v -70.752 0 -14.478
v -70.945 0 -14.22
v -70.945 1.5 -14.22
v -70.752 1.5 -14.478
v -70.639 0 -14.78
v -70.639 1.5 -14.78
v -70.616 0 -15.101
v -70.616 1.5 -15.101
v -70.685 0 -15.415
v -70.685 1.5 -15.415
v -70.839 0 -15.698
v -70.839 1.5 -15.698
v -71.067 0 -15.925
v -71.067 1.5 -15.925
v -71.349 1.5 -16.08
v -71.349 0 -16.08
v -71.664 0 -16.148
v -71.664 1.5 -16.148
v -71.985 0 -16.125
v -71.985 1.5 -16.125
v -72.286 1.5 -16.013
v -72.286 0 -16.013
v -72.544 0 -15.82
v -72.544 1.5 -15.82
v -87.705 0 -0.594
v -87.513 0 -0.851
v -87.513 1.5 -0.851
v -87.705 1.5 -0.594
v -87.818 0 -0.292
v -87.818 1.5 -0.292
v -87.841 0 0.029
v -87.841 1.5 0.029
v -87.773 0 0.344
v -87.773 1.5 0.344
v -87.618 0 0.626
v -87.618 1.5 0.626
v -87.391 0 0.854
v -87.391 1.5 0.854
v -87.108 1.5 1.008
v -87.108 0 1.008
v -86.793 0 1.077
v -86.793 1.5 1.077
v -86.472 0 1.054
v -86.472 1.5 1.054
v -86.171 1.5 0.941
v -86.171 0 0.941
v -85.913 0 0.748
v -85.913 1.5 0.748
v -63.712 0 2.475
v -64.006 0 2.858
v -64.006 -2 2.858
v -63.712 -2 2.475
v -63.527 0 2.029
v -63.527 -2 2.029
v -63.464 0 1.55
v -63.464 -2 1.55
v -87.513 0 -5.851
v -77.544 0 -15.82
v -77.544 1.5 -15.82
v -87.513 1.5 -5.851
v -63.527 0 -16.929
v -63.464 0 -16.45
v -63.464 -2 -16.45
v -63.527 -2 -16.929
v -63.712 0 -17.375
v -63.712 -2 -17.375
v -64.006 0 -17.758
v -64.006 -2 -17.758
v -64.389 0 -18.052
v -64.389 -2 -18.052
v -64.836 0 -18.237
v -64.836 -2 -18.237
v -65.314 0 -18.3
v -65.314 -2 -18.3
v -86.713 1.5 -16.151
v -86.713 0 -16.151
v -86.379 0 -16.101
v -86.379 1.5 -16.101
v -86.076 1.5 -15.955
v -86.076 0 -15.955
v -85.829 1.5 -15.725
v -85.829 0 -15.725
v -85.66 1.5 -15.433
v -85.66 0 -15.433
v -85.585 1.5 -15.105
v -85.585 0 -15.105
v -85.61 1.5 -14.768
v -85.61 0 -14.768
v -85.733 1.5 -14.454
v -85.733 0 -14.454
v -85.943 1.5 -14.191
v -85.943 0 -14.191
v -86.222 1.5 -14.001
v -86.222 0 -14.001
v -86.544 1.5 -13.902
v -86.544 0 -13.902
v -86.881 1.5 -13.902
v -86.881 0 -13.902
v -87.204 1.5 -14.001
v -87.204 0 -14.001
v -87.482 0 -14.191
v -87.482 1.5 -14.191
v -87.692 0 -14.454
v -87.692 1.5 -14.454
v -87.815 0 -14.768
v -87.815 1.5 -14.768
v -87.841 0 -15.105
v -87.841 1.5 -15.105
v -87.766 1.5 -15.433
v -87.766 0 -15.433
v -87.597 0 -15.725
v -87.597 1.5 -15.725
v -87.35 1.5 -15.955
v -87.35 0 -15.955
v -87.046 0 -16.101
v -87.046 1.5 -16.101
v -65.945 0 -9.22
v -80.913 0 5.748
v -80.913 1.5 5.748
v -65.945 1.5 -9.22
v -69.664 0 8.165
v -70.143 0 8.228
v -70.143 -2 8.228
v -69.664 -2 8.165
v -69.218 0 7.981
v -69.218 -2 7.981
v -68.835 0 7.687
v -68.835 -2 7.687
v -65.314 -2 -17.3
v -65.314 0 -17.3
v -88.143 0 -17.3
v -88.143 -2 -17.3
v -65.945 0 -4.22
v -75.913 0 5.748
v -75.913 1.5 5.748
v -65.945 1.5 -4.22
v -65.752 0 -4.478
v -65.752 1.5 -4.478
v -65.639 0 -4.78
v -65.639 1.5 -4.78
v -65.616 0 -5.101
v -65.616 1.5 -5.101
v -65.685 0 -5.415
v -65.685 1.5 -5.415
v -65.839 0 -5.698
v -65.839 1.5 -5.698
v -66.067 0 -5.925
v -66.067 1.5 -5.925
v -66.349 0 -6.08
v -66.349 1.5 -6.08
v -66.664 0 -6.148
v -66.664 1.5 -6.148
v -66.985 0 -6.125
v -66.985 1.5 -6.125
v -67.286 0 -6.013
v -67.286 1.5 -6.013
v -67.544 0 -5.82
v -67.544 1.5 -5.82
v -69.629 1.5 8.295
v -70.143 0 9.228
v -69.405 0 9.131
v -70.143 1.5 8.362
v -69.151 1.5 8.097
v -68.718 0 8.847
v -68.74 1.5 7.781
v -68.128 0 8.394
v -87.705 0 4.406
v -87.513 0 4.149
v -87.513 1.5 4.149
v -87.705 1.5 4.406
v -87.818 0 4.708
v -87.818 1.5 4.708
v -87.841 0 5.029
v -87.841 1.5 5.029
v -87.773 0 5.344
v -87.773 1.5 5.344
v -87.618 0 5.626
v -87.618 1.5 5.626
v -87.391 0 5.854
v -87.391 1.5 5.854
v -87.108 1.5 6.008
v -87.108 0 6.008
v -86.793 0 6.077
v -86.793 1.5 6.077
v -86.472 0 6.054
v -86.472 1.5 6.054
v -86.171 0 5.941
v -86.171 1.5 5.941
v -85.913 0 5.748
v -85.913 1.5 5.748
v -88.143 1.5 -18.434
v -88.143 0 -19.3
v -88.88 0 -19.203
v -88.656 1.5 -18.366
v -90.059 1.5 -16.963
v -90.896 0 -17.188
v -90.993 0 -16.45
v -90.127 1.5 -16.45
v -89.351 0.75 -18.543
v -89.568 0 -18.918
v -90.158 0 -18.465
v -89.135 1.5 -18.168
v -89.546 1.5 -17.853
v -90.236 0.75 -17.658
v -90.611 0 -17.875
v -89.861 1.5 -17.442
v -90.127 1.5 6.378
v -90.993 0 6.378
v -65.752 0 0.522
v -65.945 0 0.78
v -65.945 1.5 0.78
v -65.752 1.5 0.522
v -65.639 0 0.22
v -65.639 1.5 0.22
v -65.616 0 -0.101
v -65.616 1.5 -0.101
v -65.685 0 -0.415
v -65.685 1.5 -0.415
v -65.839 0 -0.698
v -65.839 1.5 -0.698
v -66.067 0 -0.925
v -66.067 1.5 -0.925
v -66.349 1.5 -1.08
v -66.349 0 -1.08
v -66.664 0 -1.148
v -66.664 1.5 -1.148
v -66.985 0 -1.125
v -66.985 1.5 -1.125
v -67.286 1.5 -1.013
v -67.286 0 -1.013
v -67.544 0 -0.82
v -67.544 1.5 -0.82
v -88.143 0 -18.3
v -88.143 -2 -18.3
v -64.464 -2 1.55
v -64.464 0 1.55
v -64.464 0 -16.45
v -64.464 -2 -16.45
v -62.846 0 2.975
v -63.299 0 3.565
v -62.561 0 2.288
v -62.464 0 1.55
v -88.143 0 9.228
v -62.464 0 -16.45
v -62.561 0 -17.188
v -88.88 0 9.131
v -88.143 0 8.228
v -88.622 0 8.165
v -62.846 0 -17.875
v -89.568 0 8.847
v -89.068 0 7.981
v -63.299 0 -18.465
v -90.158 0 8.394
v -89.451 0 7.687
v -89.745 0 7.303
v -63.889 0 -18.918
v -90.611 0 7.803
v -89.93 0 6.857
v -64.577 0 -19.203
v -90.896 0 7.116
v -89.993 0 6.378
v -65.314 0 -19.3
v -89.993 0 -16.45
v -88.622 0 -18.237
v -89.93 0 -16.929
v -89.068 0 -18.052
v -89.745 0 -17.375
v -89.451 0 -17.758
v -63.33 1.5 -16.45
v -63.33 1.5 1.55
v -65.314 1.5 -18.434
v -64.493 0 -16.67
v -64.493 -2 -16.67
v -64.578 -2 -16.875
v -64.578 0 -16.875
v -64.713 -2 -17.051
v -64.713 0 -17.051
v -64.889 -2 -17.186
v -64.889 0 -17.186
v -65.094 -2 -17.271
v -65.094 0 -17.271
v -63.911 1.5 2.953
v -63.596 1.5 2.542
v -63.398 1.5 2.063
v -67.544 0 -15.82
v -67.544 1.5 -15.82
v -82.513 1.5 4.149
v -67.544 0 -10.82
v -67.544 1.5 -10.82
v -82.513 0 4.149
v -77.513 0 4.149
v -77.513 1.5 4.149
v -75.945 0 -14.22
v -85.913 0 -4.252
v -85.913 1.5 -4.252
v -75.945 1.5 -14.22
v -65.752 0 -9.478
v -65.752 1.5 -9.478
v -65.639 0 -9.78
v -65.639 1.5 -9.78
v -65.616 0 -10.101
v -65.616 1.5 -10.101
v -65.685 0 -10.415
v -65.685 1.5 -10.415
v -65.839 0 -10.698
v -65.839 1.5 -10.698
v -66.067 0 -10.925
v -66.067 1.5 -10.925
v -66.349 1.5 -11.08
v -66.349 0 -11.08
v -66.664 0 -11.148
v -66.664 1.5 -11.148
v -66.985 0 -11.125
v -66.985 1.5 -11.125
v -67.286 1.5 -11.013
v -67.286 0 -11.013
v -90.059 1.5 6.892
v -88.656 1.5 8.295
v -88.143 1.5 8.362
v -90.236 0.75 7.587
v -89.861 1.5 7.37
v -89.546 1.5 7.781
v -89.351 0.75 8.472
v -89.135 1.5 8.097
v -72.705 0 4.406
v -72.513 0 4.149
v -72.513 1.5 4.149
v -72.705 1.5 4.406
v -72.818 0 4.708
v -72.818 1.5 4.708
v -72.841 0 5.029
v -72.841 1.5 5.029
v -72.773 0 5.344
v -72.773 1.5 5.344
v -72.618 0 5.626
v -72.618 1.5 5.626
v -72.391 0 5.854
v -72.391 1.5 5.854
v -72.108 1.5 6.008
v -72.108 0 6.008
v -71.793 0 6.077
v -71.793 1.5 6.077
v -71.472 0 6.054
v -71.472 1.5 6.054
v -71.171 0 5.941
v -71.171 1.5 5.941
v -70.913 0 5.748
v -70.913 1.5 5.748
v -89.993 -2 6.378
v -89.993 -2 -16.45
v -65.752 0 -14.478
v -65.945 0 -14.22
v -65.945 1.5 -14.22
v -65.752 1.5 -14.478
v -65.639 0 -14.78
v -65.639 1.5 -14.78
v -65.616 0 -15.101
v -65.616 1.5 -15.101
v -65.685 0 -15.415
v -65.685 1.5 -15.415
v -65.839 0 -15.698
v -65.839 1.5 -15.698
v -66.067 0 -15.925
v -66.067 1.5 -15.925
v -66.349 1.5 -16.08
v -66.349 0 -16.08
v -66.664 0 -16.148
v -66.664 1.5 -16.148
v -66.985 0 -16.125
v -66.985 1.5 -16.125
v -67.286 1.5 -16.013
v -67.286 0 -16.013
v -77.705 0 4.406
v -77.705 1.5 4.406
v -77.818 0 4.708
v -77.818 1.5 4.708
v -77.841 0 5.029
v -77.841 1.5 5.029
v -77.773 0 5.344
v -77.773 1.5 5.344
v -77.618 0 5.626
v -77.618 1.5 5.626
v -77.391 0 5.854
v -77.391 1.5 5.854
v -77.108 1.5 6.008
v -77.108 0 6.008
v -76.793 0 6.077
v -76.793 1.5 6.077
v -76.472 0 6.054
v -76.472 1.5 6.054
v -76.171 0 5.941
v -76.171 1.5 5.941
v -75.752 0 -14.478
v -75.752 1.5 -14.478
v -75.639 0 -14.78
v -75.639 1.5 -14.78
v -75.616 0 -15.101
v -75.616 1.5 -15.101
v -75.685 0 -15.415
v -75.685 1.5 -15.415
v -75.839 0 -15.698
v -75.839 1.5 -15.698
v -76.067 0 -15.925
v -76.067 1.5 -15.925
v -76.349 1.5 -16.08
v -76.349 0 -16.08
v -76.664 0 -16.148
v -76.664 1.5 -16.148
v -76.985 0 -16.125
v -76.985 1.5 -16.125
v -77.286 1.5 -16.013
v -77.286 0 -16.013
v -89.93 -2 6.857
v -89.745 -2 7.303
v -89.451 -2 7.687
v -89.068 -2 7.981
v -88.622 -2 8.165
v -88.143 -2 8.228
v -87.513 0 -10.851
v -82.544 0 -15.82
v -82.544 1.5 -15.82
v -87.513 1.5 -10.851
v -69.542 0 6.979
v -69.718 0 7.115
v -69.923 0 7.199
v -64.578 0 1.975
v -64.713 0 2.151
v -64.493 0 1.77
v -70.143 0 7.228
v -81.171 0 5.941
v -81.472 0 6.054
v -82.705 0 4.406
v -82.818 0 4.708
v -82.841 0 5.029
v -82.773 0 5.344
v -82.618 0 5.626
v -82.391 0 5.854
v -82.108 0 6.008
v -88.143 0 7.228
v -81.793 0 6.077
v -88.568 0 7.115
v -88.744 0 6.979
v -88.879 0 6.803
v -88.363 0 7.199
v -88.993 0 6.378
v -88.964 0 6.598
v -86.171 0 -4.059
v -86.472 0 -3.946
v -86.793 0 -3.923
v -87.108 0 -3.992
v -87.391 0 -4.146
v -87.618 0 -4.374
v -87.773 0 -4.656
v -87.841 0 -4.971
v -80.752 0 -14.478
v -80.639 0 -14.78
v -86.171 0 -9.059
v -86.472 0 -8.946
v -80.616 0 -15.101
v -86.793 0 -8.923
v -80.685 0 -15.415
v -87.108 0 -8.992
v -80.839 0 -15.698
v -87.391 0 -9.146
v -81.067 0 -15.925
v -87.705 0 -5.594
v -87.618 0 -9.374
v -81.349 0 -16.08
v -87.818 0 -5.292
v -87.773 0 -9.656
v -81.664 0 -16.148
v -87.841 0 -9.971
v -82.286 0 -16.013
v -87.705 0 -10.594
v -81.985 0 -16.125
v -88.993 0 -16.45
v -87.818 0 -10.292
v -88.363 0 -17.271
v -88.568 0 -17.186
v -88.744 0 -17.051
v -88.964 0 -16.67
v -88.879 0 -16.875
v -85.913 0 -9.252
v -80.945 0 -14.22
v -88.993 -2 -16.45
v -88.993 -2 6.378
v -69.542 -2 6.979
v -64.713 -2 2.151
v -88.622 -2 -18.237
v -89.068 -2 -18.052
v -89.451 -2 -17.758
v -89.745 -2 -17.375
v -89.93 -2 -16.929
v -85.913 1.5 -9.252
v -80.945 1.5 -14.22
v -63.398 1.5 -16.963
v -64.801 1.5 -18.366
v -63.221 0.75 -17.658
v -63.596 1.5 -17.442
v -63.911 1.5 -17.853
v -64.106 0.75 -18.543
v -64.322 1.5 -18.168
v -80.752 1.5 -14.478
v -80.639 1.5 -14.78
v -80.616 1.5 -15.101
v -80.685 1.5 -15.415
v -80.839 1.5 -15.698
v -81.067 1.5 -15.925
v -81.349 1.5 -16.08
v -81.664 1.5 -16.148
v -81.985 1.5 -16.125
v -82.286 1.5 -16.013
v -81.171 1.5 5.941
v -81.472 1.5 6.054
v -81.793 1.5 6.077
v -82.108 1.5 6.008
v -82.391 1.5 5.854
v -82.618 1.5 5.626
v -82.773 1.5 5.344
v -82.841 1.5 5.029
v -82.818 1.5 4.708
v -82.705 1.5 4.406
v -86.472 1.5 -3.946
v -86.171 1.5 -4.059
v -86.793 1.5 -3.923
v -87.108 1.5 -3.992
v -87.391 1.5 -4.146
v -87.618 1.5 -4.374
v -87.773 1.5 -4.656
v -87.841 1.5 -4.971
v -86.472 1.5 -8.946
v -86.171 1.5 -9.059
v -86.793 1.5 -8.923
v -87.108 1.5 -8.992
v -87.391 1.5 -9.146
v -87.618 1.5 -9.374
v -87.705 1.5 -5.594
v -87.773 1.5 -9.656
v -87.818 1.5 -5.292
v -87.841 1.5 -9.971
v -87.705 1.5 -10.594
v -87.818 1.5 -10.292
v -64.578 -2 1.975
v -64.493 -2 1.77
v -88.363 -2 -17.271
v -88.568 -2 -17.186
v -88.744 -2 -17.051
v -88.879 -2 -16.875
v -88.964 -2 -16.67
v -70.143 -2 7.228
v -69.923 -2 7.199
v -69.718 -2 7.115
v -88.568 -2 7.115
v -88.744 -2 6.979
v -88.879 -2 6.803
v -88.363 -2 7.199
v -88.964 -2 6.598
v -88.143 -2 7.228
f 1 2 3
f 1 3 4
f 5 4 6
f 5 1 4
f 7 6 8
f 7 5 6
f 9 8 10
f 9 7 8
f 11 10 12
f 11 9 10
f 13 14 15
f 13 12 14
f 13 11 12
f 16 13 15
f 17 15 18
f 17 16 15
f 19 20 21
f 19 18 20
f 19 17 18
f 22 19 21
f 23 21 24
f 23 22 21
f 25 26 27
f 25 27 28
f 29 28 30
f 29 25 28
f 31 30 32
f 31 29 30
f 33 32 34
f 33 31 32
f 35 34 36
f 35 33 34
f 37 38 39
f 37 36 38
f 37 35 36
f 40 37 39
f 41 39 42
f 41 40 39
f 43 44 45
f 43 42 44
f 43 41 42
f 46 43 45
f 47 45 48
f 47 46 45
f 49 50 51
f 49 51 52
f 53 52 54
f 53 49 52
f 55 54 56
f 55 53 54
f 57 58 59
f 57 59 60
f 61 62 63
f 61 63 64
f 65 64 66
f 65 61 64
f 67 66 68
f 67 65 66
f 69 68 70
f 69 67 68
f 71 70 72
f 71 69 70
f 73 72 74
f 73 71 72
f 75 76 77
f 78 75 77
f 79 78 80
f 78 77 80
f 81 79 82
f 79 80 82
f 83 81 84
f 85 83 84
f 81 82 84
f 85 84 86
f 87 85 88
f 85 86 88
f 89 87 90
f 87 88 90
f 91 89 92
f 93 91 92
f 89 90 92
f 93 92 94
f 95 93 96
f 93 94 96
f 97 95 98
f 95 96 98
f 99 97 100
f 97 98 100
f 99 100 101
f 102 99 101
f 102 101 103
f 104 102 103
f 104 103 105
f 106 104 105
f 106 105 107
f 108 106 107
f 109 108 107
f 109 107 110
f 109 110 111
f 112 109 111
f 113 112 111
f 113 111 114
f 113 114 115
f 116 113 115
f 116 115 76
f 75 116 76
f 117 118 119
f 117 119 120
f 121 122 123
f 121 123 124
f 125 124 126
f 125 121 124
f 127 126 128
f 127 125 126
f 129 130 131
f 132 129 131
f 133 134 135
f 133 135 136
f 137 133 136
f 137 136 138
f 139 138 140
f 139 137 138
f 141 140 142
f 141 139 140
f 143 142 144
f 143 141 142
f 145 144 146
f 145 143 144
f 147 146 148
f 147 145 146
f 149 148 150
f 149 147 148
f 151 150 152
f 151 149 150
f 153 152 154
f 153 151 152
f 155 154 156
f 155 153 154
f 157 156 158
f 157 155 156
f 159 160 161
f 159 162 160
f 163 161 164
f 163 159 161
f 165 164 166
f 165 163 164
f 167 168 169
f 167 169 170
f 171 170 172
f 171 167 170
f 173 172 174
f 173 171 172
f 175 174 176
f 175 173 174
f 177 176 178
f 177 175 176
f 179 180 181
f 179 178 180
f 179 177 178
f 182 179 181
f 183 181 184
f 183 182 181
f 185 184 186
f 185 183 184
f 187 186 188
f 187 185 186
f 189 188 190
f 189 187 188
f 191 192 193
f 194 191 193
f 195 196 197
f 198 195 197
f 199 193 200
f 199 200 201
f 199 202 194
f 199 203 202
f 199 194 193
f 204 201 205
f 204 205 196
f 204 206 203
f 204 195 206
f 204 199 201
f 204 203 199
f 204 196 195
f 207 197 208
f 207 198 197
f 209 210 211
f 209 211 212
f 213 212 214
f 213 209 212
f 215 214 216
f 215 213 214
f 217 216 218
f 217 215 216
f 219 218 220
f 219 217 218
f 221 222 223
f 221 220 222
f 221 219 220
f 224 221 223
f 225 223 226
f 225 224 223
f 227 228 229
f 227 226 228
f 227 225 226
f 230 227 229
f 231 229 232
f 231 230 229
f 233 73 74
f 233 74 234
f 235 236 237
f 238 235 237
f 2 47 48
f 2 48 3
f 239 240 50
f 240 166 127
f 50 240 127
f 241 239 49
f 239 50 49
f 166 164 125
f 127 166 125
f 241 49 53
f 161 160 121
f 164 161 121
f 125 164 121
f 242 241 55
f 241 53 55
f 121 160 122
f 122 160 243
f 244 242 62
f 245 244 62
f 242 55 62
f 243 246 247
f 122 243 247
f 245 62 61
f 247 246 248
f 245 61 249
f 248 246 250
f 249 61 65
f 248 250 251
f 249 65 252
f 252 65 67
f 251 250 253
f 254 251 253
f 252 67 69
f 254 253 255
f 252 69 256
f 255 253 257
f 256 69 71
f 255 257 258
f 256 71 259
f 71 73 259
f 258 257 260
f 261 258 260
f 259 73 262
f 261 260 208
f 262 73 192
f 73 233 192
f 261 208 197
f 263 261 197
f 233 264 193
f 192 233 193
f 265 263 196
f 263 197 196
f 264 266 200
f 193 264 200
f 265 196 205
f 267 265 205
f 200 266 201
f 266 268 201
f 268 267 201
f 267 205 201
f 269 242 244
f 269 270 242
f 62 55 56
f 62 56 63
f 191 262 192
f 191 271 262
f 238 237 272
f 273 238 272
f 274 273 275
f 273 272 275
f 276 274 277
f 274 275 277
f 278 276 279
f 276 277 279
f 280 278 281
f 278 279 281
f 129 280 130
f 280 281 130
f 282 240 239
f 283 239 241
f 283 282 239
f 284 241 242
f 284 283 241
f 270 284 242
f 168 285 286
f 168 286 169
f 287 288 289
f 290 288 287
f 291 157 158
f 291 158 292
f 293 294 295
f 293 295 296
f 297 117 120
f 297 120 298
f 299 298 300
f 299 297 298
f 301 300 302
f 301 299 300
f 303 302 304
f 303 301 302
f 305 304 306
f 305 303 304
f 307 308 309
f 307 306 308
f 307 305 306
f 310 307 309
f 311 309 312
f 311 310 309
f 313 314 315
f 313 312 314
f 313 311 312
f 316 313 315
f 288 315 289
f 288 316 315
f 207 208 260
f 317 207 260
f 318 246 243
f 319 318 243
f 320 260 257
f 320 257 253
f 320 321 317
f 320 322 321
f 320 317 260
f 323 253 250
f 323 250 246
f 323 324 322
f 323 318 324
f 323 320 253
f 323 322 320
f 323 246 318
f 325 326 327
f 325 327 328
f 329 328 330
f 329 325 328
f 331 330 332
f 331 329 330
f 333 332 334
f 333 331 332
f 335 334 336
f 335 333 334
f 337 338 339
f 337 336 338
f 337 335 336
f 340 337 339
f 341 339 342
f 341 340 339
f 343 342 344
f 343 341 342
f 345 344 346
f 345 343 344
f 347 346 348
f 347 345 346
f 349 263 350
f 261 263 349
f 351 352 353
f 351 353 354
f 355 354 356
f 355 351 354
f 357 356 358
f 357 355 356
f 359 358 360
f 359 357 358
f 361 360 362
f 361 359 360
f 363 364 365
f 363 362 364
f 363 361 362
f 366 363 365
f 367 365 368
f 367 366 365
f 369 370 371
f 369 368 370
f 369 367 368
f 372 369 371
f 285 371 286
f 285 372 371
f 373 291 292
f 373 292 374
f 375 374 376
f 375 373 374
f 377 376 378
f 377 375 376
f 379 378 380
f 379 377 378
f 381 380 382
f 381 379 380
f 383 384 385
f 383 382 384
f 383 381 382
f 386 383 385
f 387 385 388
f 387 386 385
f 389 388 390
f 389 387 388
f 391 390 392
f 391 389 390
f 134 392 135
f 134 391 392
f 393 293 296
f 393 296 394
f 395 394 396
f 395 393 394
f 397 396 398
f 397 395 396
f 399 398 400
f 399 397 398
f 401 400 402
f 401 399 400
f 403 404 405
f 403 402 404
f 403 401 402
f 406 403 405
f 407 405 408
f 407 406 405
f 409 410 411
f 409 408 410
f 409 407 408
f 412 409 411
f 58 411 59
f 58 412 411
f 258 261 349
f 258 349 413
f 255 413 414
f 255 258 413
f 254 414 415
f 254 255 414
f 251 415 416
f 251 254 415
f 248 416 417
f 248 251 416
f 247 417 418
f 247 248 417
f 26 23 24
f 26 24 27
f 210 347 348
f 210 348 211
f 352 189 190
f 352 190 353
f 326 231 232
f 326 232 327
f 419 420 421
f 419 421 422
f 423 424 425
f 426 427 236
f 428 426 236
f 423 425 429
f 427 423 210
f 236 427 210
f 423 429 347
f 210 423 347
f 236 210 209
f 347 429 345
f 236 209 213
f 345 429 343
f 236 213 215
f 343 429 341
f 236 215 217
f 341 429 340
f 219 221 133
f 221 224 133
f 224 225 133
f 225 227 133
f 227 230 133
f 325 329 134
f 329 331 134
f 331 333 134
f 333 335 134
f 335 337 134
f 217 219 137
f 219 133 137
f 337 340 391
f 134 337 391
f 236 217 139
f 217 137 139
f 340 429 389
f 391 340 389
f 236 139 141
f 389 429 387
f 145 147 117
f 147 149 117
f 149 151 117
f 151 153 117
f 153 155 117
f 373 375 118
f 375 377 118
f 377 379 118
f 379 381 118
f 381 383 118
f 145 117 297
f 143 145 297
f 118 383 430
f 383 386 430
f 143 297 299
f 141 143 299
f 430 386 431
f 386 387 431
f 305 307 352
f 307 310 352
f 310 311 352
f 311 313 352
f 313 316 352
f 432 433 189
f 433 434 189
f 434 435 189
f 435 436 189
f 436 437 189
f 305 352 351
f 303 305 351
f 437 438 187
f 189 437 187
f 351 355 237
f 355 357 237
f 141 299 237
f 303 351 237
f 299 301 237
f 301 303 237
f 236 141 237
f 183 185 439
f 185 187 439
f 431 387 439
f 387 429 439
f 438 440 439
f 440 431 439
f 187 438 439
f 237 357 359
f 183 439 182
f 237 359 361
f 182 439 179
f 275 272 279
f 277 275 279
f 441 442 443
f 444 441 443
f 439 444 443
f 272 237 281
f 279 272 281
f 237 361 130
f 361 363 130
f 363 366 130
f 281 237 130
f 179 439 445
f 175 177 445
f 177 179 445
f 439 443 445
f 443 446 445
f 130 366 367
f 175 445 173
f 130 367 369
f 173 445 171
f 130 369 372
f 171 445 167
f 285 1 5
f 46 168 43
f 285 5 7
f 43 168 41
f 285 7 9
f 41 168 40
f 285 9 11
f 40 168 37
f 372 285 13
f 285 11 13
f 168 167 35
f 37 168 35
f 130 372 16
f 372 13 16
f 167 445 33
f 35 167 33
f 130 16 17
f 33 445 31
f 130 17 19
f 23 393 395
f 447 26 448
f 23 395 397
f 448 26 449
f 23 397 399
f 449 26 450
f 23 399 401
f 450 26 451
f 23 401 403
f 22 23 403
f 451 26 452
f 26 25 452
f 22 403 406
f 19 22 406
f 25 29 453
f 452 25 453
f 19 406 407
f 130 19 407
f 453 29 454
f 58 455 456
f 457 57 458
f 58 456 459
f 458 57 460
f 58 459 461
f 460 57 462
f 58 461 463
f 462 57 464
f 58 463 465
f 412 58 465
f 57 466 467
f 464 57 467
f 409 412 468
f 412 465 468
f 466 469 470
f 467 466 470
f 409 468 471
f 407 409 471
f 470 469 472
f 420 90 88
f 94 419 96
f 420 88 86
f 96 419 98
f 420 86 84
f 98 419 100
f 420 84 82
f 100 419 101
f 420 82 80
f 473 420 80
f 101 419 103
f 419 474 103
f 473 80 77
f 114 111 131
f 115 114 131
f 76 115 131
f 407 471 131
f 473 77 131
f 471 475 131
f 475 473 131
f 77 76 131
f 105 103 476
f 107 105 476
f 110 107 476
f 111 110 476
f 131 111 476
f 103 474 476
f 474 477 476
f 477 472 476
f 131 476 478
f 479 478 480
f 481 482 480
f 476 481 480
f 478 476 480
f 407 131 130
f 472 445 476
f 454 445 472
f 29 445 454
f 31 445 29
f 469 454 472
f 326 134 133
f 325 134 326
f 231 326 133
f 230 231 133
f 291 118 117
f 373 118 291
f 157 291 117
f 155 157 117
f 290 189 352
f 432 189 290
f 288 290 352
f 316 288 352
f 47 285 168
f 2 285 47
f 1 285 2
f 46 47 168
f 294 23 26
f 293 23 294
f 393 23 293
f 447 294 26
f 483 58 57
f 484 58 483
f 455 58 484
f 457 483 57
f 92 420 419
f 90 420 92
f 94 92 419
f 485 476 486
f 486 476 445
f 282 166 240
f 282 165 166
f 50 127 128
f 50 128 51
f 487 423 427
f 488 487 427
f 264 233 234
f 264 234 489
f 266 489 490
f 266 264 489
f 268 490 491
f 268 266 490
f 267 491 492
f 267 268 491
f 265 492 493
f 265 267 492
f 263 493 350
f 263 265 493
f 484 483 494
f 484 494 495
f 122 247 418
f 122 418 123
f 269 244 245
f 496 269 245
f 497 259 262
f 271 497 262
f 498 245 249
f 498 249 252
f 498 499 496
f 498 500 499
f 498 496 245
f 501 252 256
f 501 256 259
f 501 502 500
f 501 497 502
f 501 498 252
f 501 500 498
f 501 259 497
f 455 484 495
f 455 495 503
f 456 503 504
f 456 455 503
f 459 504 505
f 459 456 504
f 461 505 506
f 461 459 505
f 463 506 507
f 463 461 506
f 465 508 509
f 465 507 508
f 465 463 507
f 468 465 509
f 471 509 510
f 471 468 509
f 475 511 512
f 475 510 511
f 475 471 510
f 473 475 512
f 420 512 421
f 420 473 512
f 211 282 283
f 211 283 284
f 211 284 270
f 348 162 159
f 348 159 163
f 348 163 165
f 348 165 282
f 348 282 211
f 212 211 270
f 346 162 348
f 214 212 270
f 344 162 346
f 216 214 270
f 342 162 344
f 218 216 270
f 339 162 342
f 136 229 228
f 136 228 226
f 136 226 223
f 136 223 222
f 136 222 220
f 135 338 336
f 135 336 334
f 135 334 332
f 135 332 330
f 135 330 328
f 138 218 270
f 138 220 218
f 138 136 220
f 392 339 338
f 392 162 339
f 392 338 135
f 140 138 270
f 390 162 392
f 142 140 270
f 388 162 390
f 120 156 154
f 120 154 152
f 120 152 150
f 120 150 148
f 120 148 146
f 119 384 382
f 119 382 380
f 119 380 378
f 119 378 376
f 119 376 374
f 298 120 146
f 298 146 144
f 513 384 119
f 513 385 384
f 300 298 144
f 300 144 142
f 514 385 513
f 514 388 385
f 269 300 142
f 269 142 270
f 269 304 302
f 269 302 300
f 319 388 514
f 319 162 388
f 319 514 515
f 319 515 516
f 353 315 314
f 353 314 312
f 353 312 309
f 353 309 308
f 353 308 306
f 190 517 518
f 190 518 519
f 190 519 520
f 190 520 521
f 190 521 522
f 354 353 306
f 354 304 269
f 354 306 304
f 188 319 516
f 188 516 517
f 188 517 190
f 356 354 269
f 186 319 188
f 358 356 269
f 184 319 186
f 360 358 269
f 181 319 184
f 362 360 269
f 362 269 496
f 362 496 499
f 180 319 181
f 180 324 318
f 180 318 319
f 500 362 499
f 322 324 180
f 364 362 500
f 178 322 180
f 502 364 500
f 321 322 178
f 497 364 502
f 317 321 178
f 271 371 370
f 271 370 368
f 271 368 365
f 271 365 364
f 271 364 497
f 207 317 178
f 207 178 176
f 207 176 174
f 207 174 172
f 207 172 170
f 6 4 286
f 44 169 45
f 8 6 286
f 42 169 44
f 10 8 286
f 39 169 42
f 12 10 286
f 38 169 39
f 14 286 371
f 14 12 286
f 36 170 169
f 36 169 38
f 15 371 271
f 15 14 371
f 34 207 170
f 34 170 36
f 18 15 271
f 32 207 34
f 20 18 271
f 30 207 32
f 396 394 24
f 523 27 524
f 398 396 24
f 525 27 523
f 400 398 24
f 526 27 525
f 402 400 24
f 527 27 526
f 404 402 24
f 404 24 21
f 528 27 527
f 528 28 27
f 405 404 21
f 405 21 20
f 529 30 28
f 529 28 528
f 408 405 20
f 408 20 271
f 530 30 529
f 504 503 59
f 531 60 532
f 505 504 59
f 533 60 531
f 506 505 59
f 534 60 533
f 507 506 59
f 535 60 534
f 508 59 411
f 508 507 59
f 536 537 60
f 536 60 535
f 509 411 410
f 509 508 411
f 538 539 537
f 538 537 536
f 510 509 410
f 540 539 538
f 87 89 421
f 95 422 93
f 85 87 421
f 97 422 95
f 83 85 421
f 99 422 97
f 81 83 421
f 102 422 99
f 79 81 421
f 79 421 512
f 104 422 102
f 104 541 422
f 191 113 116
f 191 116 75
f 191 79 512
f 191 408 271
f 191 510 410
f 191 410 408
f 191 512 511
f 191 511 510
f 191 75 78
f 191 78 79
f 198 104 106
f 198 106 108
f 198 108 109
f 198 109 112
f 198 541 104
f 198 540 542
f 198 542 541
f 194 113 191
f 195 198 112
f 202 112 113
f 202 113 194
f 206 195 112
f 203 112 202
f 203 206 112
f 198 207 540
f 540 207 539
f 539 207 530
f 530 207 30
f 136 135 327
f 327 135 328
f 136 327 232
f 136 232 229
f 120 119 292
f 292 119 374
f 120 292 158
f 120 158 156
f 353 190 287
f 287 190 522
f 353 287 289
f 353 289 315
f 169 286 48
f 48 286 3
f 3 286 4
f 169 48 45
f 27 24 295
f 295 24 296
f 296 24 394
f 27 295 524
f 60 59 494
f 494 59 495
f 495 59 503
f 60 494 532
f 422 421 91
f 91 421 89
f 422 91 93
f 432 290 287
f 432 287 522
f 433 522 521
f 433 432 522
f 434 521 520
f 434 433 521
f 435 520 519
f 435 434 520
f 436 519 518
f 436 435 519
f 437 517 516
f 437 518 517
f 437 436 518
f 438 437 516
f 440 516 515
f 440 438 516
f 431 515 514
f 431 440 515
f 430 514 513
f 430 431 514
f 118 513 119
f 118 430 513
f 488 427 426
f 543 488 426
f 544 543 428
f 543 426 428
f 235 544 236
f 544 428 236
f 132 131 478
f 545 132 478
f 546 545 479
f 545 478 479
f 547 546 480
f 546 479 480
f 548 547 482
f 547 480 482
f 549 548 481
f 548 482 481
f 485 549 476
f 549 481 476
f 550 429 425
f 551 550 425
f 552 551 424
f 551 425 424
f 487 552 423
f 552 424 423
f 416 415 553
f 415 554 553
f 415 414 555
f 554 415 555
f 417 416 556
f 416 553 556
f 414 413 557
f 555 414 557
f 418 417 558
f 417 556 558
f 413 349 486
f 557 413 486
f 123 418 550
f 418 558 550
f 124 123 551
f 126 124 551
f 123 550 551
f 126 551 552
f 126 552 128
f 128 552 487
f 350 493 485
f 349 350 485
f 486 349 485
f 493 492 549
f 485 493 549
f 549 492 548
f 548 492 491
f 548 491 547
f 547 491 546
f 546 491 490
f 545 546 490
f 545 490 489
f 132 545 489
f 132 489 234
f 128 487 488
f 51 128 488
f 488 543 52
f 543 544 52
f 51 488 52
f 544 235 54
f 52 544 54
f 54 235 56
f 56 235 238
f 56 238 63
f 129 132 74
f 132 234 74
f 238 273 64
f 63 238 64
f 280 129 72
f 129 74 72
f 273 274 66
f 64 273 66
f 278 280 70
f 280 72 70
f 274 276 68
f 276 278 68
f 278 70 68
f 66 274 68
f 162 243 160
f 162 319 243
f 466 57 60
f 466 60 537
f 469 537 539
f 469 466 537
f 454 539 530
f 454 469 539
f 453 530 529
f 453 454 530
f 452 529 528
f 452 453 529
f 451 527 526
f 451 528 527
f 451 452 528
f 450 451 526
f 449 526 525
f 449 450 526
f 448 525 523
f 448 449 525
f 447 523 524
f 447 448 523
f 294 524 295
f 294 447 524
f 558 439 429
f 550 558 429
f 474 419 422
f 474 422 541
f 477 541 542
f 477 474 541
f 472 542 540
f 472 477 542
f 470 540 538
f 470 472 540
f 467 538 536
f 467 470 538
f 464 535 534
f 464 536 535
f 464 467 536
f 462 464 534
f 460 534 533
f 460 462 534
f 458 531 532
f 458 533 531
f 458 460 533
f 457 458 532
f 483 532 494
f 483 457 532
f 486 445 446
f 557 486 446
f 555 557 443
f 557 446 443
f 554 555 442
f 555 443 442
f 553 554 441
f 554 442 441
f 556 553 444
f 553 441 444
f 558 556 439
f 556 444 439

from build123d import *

# Parameters (mm, degrees)
EXTRUDE_1_DEPTH     = 2
EXTRUDE_2_DEPTH     = 1.5
EXTRUDE_2_TAPER     = 30
CUT_EXTRUDE_1_REACH = 95.039
SKETCH_3_R          = 1.131038805


with BuildPart() as part:
    # 草图1 → 凸台-拉伸1 (new body)
    with BuildSketch(Plane(origin=(0, 0, 0), x_dir=(1, 0, 0), z_dir=(0, 1, 0))):
        with BuildLine():
            Line((-65.314374304, 18.3), (-88.142801429, 18.3))
            ThreePointArc((-88.142801429, 18.3), (-89.450948974, 17.758147545), (-89.992801429, 16.45))
            Line((-89.992801429, 16.45), (-89.992801429, -6.378427125))
            ThreePointArc((-89.992801429, -6.378427125), (-89.450948974, -7.68657467), (-88.142801429, -8.228427125))
            Line((-88.142801429, -8.228427125), (-70.142801429, -8.228427125))
            ThreePointArc((-70.142801429, -8.228427125), (-69.434837079, -8.08760426), (-68.834653884, -7.68657467))
            Line((-68.834653884, -7.68657467), (-64.006226759, -2.858147545))
            ThreePointArc((-64.006226759, -2.858147545), (-63.605197169, -2.25796435), (-63.464374304, -1.55))
            Line((-63.464374304, -1.55), (-63.464374304, 16.45))
            ThreePointArc((-63.464374304, 16.45), (-64.006226759, 17.758147545), (-65.314374304, 18.3))
        make_face()
        with BuildLine():
            Line((-65.314374304, 17.3), (-88.142801429, 17.3))
            ThreePointArc((-88.142801429, 17.3), (-88.743842193, 17.051040764), (-88.992801429, 16.45))
            Line((-88.992801429, 16.45), (-88.992801429, -6.378427125))
            ThreePointArc((-88.992801429, -6.378427125), (-88.743842193, -6.979467889), (-88.142801429, -7.228427125))
            Line((-88.142801429, -7.228427125), (-70.142801429, -7.228427125))
            ThreePointArc((-70.142801429, -7.228427125), (-69.817520511, -7.163724728), (-69.541760665, -6.979467889))
            Line((-69.541760665, -6.979467889), (-64.71333354, -2.151040764))
            ThreePointArc((-64.71333354, -2.151040764), (-64.529076702, -1.875280918), (-64.464374304, -1.55))
            Line((-64.464374304, -1.55), (-64.464374304, 16.45))
            ThreePointArc((-64.464374304, 16.45), (-64.71333354, 17.051040764), (-65.314374304, 17.3))
        make_face(mode=Mode.SUBTRACT)
    extrude(amount=-EXTRUDE_1_DEPTH)

    # 草图2 → 凸台-拉伸2 (add)
    with BuildSketch(Plane(origin=(0, 0, 0), x_dir=(1, 0, 0), z_dir=(0, 1, 0))):
        with BuildLine():
            Line((-65.314374304, 19.3), (-88.142801429, 19.3))
            ThreePointArc((-88.142801429, 19.3), (-90.158055755, 18.465254326), (-90.992801429, 16.45))
            Line((-90.992801429, 16.45), (-90.992801429, -6.378427125))
            ThreePointArc((-90.992801429, -6.378427125), (-90.158055755, -8.393681451), (-88.142801429, -9.228427125))
            Line((-88.142801429, -9.228427125), (-70.142801429, -9.228427125))
            ThreePointArc((-70.142801429, -9.228427125), (-69.052153647, -9.011483793), (-68.127547103, -8.393681451))
            Line((-68.127547103, -8.393681451), (-63.299119978, -3.565254327))
            ThreePointArc((-63.299119978, -3.565254327), (-62.681317637, -2.640647782), (-62.464374304, -1.55))
            Line((-62.464374304, -1.55), (-62.464374304, 16.45))
            ThreePointArc((-62.464374304, 16.45), (-63.299119978, 18.465254326), (-65.314374304, 19.3))
        make_face()
    extrude(amount=EXTRUDE_2_DEPTH, taper=EXTRUDE_2_TAPER)

    # 草图3 → 切除-拉伸1 (cut, up to next)
    with BuildSketch(Plane.XZ, mode=Mode.PRIVATE) as cut_extrude_1_sk1:
        with Locations(Location((-86.712801429, -15.02, 0), (0, 0, 270))):
            Circle(SKETCH_3_R)
    cut_extrude_1_tool1 = extrude(cut_extrude_1_sk1.sketch, amount=-CUT_EXTRUDE_1_REACH, mode=Mode.PRIVATE) & part.part
    # 草图3 → 切除-拉伸1 (cut, up to next)
    with BuildSketch(Plane.XZ, mode=Mode.PRIVATE) as cut_extrude_1_sk2:
        with BuildLine():
            Line((-85.91303622, -9.251807666), (-80.944609096, -14.220234791))
            ThreePointArc((-80.944609096, -14.220234791), (-80.944609096, -15.819765208), (-82.544139513, -15.819765208))
            Line((-82.544139513, -15.819765208), (-87.512566638, -10.851338084))
            ThreePointArc((-87.512566638, -10.851338084), (-87.512566638, -9.251807666), (-85.91303622, -9.251807666))
        make_face()
    cut_extrude_1_tool2 = extrude(cut_extrude_1_sk2.sketch, amount=-CUT_EXTRUDE_1_REACH, mode=Mode.PRIVATE) & part.part
    # 草图3 → 切除-拉伸1 (cut, up to next)
    with BuildSketch(Plane.XZ, mode=Mode.PRIVATE) as cut_extrude_1_sk3:
        with BuildLine():
            Line((-70.91303622, 5.748192334), (-65.944609096, 0.779765209))
            ThreePointArc((-65.944609096, 0.779765209), (-65.944609096, -0.819765208), (-67.544139513, -0.819765208))
            Line((-67.544139513, -0.819765208), (-72.512566638, 4.148661916))
            ThreePointArc((-72.512566638, 4.148661916), (-72.512566638, 5.748192334), (-70.91303622, 5.748192334))
        make_face()
    cut_extrude_1_tool3 = extrude(cut_extrude_1_sk3.sketch, amount=-CUT_EXTRUDE_1_REACH, mode=Mode.PRIVATE) & part.part
    # 草图3 → 切除-拉伸1 (cut, up to next)
    with BuildSketch(Plane.XZ, mode=Mode.PRIVATE) as cut_extrude_1_sk4:
        with BuildLine():
            Line((-75.91303622, 5.748192334), (-65.944609096, -4.220234791))
            ThreePointArc((-65.944609096, -4.220234791), (-65.944609096, -5.819765208), (-67.544139513, -5.819765208))
            Line((-67.544139513, -5.819765208), (-77.512566638, 4.148661916))
            ThreePointArc((-77.512566638, 4.148661916), (-77.512566638, 5.748192334), (-75.91303622, 5.748192334))
        make_face()
    cut_extrude_1_tool4 = extrude(cut_extrude_1_sk4.sketch, amount=-CUT_EXTRUDE_1_REACH, mode=Mode.PRIVATE) & part.part
    # 草图3 → 切除-拉伸1 (cut, up to next)
    with BuildSketch(Plane.XZ, mode=Mode.PRIVATE) as cut_extrude_1_sk5:
        with BuildLine():
            Line((-80.91303622, 5.748192334), (-65.944609096, -9.220234791))
            ThreePointArc((-65.944609096, -9.220234791), (-65.944609096, -10.819765208), (-67.544139513, -10.819765208))
            Line((-67.544139513, -10.819765208), (-82.512566638, 4.148661916))
            ThreePointArc((-82.512566638, 4.148661916), (-82.512566638, 5.748192334), (-80.91303622, 5.748192334))
        make_face()
    cut_extrude_1_tool5 = extrude(cut_extrude_1_sk5.sketch, amount=-CUT_EXTRUDE_1_REACH, mode=Mode.PRIVATE) & part.part
    # 草图3 → 切除-拉伸1 (cut, up to next)
    with BuildSketch(Plane.XZ, mode=Mode.PRIVATE) as cut_extrude_1_sk6:
        with BuildLine():
            Line((-85.91303622, 0.748192334), (-70.944609096, -14.220234791))
            ThreePointArc((-70.944609096, -14.220234791), (-70.944609096, -15.819765208), (-72.544139513, -15.819765208))
            Line((-72.544139513, -15.819765208), (-87.512566638, -0.851338084))
            ThreePointArc((-87.512566638, -0.851338084), (-87.512566638, 0.748192334), (-85.91303622, 0.748192334))
        make_face()
    cut_extrude_1_tool6 = extrude(cut_extrude_1_sk6.sketch, amount=-CUT_EXTRUDE_1_REACH, mode=Mode.PRIVATE) & part.part
    # 草图3 → 切除-拉伸1 (cut, up to next)
    with BuildSketch(Plane.XZ, mode=Mode.PRIVATE) as cut_extrude_1_sk7:
        with BuildLine():
            Line((-85.91303622, 5.748192334), (-65.944609096, -14.220234791))
            ThreePointArc((-65.944609096, -14.220234791), (-65.944609096, -15.819765208), (-67.544139513, -15.819765208))
            Line((-67.544139513, -15.819765208), (-87.512566638, 4.148661916))
            ThreePointArc((-87.512566638, 4.148661916), (-87.512566638, 5.748192334), (-85.91303622, 5.748192334))
        make_face()
    cut_extrude_1_tool7 = extrude(cut_extrude_1_sk7.sketch, amount=-CUT_EXTRUDE_1_REACH, mode=Mode.PRIVATE) & part.part
    # 草图3 → 切除-拉伸1 (cut, up to next)
    with BuildSketch(Plane.XZ, mode=Mode.PRIVATE) as cut_extrude_1_sk8:
        with BuildLine():
            Line((-85.91303622, -4.251807666), (-75.944609096, -14.220234791))
            ThreePointArc((-75.944609096, -14.220234791), (-75.944609096, -15.819765208), (-77.544139513, -15.819765208))
            Line((-77.544139513, -15.819765208), (-87.512566638, -5.851338084))
            ThreePointArc((-87.512566638, -5.851338084), (-87.512566638, -4.251807666), (-85.91303622, -4.251807666))
        make_face()
    cut_extrude_1_tool8 = extrude(cut_extrude_1_sk8.sketch, amount=-CUT_EXTRUDE_1_REACH, mode=Mode.PRIVATE) & part.part
    add(cut_extrude_1_tool1.solids().sort_by_distance((-86.712801, 0, -15.02))[0], mode=Mode.SUBTRACT)
    add(cut_extrude_1_tool2.solids().sort_by_distance((-84.228588, 0, -12.535786))[0], mode=Mode.SUBTRACT)
    add(cut_extrude_1_tool3.solids().sort_by_distance((-69.228588, 0, 2.464214))[0], mode=Mode.SUBTRACT)
    add(cut_extrude_1_tool4.solids().sort_by_distance((-71.728588, 0, -0.035786))[0], mode=Mode.SUBTRACT)
    add(cut_extrude_1_tool5.solids().sort_by_distance((-74.228588, 0, -2.535786))[0], mode=Mode.SUBTRACT)
    add(cut_extrude_1_tool6.solids().sort_by_distance((-79.228588, 0, -7.535786))[0], mode=Mode.SUBTRACT)
    add(cut_extrude_1_tool7.solids().sort_by_distance((-76.728588, 0, -5.035786))[0], mode=Mode.SUBTRACT)
    add(cut_extrude_1_tool8.solids().sort_by_distance((-81.728588, 0, -10.035786))[0], mode=Mode.SUBTRACT)


solid = part.part
